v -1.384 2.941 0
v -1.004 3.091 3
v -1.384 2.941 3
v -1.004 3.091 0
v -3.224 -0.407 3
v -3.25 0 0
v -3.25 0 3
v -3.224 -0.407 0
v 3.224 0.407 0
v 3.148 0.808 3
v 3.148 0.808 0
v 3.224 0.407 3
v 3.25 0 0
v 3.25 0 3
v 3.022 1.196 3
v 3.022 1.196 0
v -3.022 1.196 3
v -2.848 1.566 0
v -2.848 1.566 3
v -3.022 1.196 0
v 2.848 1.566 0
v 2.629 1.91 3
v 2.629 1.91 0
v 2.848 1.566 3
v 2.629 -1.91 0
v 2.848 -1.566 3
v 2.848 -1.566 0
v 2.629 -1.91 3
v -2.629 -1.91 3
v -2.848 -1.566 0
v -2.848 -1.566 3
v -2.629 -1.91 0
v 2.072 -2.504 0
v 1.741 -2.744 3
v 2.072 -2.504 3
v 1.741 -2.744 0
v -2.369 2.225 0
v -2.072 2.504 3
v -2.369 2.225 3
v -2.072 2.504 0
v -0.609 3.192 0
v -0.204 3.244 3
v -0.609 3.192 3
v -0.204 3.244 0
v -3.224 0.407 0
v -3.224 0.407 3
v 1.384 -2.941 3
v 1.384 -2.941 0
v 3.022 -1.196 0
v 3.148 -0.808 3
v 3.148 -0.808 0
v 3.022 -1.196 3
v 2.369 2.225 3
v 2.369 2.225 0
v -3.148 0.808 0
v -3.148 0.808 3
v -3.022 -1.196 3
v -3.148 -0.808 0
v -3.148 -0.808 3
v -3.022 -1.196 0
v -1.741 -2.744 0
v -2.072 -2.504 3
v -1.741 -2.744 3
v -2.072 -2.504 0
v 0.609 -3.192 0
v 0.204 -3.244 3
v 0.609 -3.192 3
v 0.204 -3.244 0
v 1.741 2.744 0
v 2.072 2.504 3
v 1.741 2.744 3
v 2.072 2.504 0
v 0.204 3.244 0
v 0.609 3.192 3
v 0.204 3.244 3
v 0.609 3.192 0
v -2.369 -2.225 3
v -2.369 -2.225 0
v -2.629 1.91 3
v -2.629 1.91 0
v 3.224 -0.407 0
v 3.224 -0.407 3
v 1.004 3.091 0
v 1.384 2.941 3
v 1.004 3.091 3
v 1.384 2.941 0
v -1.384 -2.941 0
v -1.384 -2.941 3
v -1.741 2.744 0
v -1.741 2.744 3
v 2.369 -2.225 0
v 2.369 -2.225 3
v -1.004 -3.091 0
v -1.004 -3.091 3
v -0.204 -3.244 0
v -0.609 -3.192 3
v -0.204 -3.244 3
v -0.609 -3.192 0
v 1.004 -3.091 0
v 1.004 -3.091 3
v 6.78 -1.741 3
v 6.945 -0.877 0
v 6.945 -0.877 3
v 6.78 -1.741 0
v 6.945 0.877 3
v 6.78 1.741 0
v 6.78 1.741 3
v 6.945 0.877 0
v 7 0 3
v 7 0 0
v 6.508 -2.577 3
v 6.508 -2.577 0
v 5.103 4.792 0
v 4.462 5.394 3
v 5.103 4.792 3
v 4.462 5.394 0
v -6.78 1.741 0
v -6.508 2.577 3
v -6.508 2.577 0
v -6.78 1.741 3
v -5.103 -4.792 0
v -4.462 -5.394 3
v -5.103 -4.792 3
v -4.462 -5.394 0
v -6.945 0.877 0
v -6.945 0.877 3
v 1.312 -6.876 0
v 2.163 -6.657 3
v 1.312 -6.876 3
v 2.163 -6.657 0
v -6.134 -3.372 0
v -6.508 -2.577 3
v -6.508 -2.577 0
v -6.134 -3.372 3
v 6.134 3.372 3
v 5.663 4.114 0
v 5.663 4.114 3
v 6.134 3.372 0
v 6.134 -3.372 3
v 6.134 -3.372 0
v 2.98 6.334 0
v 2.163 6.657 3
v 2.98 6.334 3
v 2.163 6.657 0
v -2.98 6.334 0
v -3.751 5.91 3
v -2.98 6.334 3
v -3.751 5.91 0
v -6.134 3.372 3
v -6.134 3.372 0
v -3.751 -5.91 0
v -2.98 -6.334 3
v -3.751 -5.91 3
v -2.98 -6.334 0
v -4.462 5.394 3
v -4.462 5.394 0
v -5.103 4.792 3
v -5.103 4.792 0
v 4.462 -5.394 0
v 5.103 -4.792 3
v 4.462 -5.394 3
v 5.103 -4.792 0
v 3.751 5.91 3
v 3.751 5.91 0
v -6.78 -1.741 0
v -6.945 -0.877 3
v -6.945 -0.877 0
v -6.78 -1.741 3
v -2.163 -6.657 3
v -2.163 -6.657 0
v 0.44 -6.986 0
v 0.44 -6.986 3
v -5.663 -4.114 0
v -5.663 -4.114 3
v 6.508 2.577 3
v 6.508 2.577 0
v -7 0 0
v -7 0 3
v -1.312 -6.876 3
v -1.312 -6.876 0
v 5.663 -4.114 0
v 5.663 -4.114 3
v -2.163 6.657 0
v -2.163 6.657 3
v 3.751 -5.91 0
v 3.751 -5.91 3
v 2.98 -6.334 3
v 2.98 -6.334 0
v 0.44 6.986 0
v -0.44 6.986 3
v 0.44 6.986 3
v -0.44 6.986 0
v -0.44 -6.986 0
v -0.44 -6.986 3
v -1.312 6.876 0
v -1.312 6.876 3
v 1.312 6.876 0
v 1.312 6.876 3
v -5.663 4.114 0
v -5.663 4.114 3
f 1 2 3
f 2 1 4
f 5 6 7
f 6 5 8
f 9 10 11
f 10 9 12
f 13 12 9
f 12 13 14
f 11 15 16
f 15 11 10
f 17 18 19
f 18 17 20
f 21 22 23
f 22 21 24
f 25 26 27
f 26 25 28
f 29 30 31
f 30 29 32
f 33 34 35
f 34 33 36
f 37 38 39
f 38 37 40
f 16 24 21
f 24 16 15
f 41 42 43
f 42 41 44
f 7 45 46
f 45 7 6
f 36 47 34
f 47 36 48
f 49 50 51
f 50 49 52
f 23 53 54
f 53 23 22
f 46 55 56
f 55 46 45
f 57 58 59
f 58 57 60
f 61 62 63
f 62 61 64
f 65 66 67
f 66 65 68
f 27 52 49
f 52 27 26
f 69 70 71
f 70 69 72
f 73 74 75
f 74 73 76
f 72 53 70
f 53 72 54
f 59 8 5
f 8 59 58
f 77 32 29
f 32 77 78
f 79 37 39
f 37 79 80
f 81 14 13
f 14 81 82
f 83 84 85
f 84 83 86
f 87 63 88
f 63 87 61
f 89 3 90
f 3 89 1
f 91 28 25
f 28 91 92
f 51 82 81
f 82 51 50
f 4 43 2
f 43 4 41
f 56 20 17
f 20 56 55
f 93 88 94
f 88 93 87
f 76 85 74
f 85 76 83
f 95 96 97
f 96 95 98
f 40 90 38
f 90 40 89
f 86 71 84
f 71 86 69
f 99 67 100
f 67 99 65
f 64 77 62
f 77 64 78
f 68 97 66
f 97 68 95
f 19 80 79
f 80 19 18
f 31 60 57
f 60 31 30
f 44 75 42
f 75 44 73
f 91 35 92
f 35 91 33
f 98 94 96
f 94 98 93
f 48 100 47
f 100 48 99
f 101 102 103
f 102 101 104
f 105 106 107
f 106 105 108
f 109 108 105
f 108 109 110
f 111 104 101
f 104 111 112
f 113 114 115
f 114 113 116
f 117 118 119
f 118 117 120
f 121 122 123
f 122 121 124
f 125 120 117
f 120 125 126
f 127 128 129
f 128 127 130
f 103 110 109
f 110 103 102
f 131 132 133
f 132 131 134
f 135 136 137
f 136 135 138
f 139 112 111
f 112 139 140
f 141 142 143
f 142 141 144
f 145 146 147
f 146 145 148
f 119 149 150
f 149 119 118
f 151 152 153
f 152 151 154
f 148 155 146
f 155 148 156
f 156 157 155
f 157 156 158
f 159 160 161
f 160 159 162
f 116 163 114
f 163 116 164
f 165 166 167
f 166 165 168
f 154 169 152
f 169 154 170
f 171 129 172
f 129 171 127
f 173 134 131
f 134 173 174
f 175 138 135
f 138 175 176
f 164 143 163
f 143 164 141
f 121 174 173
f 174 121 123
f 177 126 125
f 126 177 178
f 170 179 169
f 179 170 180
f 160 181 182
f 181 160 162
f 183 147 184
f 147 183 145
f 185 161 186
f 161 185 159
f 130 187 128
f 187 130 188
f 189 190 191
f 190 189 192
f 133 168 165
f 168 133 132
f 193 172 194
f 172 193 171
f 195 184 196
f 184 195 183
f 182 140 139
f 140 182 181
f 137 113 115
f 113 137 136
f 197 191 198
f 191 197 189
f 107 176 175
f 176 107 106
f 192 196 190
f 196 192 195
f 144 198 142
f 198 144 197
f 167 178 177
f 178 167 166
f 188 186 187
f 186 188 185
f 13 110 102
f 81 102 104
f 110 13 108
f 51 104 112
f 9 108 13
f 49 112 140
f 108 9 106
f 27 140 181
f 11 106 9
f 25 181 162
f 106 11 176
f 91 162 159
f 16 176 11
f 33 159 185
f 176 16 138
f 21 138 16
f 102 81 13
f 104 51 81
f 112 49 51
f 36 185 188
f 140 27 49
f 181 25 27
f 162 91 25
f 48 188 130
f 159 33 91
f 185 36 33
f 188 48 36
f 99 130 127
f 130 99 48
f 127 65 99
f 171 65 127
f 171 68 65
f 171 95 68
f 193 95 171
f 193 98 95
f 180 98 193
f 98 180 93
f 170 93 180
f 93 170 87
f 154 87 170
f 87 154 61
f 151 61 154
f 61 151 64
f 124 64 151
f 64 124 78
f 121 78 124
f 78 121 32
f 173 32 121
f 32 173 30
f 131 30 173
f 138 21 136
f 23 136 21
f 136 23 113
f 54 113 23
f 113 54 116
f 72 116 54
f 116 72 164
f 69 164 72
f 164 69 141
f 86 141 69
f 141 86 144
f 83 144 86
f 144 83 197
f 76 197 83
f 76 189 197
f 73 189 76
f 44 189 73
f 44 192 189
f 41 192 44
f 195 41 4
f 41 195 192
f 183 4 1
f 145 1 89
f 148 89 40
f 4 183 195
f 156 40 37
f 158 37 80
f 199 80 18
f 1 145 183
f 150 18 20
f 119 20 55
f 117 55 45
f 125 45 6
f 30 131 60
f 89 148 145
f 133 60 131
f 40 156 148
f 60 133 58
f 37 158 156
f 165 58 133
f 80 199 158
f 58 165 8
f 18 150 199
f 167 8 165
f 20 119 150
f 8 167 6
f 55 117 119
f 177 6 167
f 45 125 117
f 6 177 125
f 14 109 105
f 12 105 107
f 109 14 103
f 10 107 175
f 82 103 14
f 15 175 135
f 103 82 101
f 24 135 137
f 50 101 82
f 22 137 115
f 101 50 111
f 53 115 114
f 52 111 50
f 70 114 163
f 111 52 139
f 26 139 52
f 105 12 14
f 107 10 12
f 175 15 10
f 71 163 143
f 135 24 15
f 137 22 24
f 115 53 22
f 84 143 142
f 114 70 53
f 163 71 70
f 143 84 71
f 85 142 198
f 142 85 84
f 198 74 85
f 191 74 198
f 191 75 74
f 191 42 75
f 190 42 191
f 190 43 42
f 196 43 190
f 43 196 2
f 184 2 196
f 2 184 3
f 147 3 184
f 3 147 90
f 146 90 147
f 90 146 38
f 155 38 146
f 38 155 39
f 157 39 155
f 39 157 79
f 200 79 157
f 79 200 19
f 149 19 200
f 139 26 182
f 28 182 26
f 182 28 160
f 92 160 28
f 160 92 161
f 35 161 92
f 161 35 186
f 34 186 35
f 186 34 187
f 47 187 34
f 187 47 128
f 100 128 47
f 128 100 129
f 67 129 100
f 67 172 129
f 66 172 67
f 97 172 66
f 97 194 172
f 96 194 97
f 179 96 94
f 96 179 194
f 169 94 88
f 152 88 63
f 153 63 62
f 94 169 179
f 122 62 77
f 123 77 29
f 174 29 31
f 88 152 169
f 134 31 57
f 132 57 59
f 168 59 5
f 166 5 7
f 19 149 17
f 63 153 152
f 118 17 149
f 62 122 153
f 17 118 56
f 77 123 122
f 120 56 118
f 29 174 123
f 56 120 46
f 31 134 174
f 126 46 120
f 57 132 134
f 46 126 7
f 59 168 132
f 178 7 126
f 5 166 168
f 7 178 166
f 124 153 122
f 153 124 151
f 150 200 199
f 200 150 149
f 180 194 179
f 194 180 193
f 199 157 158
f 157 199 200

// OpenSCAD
$fn = 50;

difference() {
	union() {
		cylinder(h = 3, r = 7.0);
	}
	union() {
		translate(v = [0.0, 0.0, -100.0]) {
			cylinder(h = 200, r = 3.25);
		}
		translate(v = [0.0, 0.0, -100.0]) {
			cylinder(h = 200, r = 1.8);
		}
		cylinder(h = 3, r = 2.5);
	}
}
